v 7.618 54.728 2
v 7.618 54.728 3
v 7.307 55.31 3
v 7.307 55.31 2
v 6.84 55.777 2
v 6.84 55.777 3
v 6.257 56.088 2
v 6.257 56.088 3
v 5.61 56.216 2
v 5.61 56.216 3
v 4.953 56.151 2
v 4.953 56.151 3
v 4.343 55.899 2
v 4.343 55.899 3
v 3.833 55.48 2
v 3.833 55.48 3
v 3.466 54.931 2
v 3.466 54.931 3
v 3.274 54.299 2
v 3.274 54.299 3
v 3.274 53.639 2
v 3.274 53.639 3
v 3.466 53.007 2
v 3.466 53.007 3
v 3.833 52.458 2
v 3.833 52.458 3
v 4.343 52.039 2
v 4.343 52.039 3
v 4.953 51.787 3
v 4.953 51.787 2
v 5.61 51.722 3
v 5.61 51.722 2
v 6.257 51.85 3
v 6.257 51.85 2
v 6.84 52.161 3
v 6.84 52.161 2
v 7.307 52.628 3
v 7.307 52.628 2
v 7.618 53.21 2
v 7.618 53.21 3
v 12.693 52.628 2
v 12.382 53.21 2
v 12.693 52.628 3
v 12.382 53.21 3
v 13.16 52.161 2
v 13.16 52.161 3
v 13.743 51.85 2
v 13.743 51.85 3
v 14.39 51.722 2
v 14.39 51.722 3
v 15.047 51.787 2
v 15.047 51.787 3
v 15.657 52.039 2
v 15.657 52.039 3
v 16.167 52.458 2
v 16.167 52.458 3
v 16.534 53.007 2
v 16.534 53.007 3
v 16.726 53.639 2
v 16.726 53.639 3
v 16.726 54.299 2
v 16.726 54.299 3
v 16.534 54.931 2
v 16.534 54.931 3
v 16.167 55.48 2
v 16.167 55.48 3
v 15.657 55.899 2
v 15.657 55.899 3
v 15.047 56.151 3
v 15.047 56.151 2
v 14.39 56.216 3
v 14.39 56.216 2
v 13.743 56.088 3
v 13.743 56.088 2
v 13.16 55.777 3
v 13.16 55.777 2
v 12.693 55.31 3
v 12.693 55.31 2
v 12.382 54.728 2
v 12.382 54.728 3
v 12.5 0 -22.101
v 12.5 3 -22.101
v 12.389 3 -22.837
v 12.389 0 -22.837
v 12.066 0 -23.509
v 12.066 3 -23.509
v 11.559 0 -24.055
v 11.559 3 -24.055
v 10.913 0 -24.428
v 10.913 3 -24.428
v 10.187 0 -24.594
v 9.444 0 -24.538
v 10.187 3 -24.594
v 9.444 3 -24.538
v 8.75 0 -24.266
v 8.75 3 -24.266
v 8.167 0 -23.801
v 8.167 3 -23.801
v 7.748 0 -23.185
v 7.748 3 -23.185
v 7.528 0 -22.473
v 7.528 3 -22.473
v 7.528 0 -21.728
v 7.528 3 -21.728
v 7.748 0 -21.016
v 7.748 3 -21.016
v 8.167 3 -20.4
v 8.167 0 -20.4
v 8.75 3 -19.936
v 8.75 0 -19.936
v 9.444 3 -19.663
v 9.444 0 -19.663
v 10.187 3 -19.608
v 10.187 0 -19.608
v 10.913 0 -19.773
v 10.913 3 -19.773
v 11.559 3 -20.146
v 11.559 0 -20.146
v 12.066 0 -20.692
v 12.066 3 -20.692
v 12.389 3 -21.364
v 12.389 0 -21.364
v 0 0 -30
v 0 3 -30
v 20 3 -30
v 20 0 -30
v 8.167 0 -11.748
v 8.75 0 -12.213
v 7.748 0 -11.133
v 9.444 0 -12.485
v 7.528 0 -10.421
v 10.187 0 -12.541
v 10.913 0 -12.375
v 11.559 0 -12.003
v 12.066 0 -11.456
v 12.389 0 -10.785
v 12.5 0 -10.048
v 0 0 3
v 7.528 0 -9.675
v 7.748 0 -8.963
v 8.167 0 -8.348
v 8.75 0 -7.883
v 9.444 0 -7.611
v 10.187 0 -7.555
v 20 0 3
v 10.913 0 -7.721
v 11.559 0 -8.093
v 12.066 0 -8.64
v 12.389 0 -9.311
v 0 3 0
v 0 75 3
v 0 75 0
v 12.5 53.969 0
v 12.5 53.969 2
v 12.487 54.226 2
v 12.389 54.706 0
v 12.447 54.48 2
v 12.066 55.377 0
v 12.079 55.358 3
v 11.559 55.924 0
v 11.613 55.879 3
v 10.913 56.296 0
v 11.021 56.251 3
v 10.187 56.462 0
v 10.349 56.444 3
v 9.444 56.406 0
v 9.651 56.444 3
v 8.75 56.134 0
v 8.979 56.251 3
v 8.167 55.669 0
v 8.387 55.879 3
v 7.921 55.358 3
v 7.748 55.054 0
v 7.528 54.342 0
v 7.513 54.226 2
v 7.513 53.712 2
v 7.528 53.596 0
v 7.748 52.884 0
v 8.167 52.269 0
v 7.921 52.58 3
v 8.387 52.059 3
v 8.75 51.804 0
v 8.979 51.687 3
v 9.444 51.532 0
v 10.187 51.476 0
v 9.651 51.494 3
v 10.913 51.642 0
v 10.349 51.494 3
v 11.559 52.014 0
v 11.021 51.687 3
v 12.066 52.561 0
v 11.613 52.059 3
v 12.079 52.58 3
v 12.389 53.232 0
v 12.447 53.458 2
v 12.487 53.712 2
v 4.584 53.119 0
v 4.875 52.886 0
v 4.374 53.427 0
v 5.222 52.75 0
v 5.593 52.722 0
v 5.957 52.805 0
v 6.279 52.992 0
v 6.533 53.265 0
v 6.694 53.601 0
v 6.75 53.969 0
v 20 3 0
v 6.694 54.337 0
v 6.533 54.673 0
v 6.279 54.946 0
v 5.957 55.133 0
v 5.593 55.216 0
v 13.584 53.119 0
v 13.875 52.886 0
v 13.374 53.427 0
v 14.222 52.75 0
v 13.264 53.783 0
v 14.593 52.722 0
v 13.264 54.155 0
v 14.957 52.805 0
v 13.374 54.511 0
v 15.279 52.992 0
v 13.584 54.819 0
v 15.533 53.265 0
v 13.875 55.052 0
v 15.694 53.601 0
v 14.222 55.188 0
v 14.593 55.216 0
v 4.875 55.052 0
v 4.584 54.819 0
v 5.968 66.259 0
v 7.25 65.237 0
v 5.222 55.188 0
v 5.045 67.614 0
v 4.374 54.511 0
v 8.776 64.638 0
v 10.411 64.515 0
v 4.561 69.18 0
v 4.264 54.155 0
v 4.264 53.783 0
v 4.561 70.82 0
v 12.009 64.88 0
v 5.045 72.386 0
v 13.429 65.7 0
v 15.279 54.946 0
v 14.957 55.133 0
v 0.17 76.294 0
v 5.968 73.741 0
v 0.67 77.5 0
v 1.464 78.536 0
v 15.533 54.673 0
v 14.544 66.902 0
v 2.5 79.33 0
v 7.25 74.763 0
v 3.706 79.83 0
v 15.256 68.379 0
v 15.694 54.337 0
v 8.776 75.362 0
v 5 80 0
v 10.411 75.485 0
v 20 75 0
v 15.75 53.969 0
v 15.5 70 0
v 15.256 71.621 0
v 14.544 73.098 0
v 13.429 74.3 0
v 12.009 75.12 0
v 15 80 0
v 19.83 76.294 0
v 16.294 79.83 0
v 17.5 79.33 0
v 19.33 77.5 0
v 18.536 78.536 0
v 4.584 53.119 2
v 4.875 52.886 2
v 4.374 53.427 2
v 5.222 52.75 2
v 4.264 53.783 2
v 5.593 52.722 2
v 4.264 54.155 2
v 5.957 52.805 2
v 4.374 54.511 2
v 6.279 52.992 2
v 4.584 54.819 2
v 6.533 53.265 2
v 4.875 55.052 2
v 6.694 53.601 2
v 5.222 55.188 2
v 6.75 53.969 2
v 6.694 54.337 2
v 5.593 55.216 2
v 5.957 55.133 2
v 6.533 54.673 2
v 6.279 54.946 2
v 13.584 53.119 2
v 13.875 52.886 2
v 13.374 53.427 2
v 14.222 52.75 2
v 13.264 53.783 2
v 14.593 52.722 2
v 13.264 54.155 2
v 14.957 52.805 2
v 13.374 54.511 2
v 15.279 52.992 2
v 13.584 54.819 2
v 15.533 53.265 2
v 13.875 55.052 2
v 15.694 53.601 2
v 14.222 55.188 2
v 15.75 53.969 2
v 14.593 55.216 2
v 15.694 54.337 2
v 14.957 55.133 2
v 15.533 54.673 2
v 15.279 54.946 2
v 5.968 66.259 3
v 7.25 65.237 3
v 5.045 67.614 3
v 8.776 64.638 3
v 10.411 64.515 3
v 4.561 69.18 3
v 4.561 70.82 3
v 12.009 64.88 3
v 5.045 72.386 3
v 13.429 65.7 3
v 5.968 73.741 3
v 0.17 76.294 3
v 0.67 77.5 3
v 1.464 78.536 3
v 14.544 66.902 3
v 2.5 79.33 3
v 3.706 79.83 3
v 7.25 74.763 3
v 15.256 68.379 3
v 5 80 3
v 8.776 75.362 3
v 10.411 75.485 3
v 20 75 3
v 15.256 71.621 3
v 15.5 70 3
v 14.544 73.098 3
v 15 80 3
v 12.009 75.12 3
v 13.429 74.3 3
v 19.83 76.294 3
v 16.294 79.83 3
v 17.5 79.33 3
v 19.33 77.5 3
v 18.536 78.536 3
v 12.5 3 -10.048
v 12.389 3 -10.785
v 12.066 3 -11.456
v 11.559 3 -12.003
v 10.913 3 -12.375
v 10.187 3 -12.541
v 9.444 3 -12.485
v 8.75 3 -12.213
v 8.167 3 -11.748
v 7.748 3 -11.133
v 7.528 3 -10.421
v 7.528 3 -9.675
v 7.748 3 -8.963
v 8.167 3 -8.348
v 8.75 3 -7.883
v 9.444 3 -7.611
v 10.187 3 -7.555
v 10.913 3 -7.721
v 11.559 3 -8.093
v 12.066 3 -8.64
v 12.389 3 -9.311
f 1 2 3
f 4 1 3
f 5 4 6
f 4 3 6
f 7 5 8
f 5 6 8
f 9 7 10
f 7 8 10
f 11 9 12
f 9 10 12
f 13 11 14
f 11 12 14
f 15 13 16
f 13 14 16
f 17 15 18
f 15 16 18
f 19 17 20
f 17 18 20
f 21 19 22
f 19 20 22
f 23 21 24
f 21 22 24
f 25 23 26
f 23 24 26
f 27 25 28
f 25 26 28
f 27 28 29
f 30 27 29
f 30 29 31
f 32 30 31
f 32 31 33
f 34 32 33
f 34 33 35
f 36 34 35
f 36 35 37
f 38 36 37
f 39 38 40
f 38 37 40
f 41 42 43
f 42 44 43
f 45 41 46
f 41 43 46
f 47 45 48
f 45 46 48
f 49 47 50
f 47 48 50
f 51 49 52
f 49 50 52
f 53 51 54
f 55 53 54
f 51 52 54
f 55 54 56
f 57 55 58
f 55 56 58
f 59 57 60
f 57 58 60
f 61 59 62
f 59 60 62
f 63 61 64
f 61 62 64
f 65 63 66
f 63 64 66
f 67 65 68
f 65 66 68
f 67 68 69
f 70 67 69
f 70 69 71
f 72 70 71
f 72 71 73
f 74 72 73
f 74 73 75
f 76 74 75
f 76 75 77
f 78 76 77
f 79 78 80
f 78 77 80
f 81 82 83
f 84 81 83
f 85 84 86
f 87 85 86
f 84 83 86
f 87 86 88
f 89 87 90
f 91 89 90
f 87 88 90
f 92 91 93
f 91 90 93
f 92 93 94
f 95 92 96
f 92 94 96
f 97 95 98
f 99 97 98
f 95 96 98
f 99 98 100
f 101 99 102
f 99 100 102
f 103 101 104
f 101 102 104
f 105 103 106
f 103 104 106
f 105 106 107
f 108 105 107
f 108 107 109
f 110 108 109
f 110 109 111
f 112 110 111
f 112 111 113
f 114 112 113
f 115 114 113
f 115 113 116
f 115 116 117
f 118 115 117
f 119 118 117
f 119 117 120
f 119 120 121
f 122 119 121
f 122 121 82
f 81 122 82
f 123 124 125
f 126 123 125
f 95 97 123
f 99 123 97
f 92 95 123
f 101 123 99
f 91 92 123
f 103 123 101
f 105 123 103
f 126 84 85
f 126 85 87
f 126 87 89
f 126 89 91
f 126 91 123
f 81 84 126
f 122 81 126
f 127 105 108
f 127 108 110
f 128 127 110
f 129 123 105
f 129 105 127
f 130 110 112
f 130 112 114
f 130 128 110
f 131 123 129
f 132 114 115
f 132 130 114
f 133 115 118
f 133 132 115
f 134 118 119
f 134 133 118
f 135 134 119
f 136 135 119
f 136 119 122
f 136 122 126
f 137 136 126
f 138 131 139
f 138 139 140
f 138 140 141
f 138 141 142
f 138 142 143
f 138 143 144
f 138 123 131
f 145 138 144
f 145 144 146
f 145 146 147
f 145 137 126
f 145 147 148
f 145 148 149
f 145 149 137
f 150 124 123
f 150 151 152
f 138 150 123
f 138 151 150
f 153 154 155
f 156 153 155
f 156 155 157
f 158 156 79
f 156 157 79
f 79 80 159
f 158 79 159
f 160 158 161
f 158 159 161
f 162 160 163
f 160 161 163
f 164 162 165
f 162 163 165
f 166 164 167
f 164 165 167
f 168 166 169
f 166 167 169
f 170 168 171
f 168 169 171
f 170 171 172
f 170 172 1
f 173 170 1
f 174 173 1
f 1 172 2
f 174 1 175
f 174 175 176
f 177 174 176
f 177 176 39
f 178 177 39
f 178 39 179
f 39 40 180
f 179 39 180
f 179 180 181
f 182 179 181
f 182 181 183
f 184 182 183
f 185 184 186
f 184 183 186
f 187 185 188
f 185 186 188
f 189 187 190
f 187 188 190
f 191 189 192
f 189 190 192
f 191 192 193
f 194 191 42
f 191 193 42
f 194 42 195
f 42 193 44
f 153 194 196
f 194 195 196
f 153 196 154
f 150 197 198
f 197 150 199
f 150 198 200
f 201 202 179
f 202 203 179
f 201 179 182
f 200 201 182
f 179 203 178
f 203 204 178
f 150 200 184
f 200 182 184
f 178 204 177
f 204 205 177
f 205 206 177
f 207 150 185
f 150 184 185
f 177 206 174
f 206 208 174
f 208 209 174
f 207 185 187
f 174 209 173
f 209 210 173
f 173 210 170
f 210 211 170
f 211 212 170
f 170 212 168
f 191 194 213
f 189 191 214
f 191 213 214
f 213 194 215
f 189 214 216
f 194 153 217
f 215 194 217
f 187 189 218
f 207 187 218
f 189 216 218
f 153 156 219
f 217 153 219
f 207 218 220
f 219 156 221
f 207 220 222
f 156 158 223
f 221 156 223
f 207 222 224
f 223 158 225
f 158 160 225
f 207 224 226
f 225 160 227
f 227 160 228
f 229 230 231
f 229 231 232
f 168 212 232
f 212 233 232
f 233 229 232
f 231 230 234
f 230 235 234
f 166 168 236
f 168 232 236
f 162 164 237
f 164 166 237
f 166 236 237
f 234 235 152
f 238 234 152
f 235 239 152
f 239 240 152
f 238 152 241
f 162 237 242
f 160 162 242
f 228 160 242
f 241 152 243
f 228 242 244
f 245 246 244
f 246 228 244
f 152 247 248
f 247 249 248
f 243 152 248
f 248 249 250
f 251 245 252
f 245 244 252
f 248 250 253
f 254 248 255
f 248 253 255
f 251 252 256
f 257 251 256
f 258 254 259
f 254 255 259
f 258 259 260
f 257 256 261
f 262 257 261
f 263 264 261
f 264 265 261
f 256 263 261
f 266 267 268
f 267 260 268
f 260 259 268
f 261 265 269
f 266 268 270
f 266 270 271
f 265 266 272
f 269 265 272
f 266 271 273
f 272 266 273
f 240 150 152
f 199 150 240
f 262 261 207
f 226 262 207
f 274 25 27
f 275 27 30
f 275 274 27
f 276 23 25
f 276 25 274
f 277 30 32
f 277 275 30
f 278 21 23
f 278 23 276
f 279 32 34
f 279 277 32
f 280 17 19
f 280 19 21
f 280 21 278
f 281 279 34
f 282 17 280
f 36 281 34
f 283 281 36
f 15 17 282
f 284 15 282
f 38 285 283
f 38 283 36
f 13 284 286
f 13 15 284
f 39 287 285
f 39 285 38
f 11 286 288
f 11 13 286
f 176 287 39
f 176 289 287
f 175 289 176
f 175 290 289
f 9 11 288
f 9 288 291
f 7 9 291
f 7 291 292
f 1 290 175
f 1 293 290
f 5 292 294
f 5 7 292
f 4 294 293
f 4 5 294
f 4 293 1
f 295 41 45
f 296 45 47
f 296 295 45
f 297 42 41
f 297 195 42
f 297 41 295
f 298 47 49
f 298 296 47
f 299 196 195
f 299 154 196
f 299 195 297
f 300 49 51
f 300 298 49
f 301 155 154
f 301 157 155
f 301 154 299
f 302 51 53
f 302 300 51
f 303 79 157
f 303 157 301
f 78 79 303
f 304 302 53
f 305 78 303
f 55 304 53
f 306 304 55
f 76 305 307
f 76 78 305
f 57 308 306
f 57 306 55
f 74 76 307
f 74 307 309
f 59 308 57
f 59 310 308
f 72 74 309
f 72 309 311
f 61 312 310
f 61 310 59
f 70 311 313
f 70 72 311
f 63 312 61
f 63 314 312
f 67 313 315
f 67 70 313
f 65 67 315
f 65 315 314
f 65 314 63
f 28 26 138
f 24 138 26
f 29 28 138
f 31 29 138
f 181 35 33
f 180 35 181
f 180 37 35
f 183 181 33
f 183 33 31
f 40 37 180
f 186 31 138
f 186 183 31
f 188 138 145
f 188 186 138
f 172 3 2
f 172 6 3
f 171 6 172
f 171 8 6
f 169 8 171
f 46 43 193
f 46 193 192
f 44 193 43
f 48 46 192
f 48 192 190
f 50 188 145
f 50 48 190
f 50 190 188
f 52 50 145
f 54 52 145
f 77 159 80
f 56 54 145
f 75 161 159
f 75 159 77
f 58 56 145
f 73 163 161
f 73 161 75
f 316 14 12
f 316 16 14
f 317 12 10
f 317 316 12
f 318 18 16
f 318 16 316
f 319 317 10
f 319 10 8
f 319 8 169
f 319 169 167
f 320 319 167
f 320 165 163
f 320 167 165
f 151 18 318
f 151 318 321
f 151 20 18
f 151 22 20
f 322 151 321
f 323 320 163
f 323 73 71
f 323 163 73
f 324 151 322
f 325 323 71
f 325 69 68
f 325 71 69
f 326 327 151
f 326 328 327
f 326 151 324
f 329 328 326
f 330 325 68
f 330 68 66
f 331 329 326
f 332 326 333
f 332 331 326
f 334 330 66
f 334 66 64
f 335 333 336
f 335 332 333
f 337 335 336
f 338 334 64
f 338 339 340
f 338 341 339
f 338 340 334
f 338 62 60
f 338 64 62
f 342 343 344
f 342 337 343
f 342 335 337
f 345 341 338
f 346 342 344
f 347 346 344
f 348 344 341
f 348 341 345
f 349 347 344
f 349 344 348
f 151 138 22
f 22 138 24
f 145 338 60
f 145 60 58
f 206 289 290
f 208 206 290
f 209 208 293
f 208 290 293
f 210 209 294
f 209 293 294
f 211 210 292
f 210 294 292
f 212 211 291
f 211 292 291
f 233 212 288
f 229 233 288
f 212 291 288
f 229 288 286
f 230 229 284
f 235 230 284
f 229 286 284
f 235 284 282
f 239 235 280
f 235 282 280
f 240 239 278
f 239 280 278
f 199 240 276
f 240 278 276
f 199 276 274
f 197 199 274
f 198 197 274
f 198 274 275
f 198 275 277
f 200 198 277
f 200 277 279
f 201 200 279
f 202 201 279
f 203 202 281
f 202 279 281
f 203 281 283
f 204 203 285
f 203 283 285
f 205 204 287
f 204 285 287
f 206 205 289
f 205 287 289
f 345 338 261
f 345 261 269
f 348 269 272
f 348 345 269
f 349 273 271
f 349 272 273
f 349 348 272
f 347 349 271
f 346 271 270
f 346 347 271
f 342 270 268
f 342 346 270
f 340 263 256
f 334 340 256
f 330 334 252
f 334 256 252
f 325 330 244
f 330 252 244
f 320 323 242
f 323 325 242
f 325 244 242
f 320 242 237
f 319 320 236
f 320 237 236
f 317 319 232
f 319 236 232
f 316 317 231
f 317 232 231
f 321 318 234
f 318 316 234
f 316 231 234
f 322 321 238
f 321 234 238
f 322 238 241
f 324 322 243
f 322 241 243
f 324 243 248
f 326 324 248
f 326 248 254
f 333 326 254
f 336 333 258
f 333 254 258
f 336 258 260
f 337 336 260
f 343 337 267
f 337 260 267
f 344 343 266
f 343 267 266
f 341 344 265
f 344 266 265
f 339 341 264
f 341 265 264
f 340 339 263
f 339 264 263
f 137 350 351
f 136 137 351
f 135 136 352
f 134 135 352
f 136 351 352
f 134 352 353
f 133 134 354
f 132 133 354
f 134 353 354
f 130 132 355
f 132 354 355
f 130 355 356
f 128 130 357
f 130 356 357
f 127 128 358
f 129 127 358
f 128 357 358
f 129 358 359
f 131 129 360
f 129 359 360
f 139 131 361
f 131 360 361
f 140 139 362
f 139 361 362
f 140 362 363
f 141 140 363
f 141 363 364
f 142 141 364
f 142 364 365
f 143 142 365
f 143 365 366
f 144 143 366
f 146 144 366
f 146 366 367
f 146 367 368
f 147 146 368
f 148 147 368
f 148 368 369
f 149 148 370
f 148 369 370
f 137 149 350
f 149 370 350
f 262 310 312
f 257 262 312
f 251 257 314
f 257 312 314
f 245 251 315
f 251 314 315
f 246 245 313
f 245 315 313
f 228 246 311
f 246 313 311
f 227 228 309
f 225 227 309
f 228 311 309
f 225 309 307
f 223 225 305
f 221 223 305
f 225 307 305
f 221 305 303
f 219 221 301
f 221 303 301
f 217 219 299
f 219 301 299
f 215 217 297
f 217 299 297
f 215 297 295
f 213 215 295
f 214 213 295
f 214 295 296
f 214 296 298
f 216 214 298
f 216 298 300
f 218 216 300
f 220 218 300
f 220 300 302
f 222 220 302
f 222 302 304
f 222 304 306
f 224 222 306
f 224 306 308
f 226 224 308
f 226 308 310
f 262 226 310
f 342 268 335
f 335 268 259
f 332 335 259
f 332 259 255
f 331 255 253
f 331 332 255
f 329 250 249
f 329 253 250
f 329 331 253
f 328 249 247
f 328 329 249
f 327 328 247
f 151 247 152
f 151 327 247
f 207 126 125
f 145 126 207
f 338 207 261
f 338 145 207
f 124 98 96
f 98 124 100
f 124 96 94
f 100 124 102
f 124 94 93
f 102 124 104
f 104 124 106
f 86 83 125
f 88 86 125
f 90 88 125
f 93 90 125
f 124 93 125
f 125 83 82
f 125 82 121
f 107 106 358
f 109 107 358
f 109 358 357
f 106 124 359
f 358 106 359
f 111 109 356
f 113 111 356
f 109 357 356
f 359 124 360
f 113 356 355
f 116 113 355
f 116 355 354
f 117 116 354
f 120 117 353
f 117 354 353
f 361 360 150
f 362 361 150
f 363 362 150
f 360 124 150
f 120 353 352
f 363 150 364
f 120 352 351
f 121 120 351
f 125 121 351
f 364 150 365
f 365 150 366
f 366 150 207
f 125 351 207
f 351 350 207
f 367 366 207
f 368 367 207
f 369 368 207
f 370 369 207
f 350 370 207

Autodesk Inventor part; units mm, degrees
ref_plane "YZ Plane" through (0, 0, 0) normal (1, 0, 0) x (0, 1, 0)
ref_plane "XZ Plane" through (0, 0, 0) normal (0, 1, 0) x (-1, 0, 0)
ref_plane "XY Plane" through (0, 0, 0) normal (0, 0, 1) x (1, 0, 0)
sketch "Sketch1" plane through (0, 0, 0) normal (0, 0, 1) x (1, 0, 0)
  line L0 (0, 0) -> (20, 0)
  line L1 (20, 0) -> (20, 80)
  line L2 (20, 80) -> (0, 80)
  line L3 (0, 80) -> (0, 0)
  circle A0 centre (10, 70) radius 5.5
  line L4 (20, 0) -> (0, 0)
  line L5 (0, 0) -> (0, 3)
  line L6 (0, 3) -> (20, 3)
  line L7 (20, 3) -> (20, 0)
  point P0 (10, 0)
  dimension "d0" = 20
  dimension "d1" = 80
  dimension "d2" = 11
  dimension "d3" = 70
  dimension "d7" = 3
extrude "Extrusion1" add sketch "Sketch1" along normal blind 3
fillet "Fillet1" radius 5 2 edges at (20, 80, 1.5) (0, 80, 1.5)
extrude "Extrusion2" add sketch "Sketch1" against normal blind 30 contours L3 L6 L1 L0
sketch "Sketch2" plane through (0, 3, 0) normal (0, 1, 0) x (1, 0, 0)
  circle A0 centre (10, 22.1006) radius 2.5
  circle A1 centre (10, 10.048) radius 2.5
  point P0 (0, 0)
  dimension "d10" = 5
  dimension "d11" = 5
extrude "Extrusion3" cut sketch "Sketch2" against normal through all
extrude "Extrusion4" cut sketch "Sketch1" along normal blind 10 contours A0
extrude "Extrusion5" cut sketch "Sketch1" along normal blind 10 contours A0
sketch "Sketch3" plane through (0, 0, 3) normal (0, 0, 1) x (1, 0, 0)
  circle A0 centre (10, 53.969) radius 2.5
  circle A1 centre (10, 70) radius 5.5 projected
  circle A2 centre (14.5, 53.969) radius 2.25
  circle A3 centre (5.5, 53.969) radius 2.25
  point P0 (0, 0)
  point P1 (7.6181, 54.7282)
  point P2 (7.6181, 53.2098)
  point P3 (12.3819, 53.2098)
  point P4 (12.3819, 54.7282)
  dimension "d18" = 5
  dimension "d19" = 16.031
  dimension "d20" = 4.5
  dimension "d21" = 4.5
  dimension "d22" = 4.5
  dimension "d23" = 4.5
extrude "Extrusion6" cut sketch "Sketch3" against normal blind 1 contours A0 A2 | A0 A2 | A2 A0 A3 | A3 A0 | A0 A3
extrude "Extrusion7" cut sketch "Sketch3" against normal through all contours A0 A2 | A2 A0 A3 | A3 A0 picked at (12.3432, 53.969) picked at (7.5921, 53.969)
sketch "Sketch4" plane through (0, 0, 2) normal (0, 0, 1) x (1, 0, 0)
  arc A0 (7.6181, 54.7282) -> (7.6181, 53.2098) centre (5.5, 53.969) ccw projected
  circle A1 centre (5.5, 53.969) radius 1.25
  arc A2 (12.3819, 53.2098) -> (12.3819, 54.7282) centre (14.5, 53.969) ccw projected
  circle A3 centre (14.5, 53.969) radius 1.25
  point P0 (0, 0)
  dimension "d28" = 2.5
  dimension "d29" = 2.5
extrude "Extrusion8" cut sketch "Sketch4" against normal through all
properties part number "roll stand 1"
